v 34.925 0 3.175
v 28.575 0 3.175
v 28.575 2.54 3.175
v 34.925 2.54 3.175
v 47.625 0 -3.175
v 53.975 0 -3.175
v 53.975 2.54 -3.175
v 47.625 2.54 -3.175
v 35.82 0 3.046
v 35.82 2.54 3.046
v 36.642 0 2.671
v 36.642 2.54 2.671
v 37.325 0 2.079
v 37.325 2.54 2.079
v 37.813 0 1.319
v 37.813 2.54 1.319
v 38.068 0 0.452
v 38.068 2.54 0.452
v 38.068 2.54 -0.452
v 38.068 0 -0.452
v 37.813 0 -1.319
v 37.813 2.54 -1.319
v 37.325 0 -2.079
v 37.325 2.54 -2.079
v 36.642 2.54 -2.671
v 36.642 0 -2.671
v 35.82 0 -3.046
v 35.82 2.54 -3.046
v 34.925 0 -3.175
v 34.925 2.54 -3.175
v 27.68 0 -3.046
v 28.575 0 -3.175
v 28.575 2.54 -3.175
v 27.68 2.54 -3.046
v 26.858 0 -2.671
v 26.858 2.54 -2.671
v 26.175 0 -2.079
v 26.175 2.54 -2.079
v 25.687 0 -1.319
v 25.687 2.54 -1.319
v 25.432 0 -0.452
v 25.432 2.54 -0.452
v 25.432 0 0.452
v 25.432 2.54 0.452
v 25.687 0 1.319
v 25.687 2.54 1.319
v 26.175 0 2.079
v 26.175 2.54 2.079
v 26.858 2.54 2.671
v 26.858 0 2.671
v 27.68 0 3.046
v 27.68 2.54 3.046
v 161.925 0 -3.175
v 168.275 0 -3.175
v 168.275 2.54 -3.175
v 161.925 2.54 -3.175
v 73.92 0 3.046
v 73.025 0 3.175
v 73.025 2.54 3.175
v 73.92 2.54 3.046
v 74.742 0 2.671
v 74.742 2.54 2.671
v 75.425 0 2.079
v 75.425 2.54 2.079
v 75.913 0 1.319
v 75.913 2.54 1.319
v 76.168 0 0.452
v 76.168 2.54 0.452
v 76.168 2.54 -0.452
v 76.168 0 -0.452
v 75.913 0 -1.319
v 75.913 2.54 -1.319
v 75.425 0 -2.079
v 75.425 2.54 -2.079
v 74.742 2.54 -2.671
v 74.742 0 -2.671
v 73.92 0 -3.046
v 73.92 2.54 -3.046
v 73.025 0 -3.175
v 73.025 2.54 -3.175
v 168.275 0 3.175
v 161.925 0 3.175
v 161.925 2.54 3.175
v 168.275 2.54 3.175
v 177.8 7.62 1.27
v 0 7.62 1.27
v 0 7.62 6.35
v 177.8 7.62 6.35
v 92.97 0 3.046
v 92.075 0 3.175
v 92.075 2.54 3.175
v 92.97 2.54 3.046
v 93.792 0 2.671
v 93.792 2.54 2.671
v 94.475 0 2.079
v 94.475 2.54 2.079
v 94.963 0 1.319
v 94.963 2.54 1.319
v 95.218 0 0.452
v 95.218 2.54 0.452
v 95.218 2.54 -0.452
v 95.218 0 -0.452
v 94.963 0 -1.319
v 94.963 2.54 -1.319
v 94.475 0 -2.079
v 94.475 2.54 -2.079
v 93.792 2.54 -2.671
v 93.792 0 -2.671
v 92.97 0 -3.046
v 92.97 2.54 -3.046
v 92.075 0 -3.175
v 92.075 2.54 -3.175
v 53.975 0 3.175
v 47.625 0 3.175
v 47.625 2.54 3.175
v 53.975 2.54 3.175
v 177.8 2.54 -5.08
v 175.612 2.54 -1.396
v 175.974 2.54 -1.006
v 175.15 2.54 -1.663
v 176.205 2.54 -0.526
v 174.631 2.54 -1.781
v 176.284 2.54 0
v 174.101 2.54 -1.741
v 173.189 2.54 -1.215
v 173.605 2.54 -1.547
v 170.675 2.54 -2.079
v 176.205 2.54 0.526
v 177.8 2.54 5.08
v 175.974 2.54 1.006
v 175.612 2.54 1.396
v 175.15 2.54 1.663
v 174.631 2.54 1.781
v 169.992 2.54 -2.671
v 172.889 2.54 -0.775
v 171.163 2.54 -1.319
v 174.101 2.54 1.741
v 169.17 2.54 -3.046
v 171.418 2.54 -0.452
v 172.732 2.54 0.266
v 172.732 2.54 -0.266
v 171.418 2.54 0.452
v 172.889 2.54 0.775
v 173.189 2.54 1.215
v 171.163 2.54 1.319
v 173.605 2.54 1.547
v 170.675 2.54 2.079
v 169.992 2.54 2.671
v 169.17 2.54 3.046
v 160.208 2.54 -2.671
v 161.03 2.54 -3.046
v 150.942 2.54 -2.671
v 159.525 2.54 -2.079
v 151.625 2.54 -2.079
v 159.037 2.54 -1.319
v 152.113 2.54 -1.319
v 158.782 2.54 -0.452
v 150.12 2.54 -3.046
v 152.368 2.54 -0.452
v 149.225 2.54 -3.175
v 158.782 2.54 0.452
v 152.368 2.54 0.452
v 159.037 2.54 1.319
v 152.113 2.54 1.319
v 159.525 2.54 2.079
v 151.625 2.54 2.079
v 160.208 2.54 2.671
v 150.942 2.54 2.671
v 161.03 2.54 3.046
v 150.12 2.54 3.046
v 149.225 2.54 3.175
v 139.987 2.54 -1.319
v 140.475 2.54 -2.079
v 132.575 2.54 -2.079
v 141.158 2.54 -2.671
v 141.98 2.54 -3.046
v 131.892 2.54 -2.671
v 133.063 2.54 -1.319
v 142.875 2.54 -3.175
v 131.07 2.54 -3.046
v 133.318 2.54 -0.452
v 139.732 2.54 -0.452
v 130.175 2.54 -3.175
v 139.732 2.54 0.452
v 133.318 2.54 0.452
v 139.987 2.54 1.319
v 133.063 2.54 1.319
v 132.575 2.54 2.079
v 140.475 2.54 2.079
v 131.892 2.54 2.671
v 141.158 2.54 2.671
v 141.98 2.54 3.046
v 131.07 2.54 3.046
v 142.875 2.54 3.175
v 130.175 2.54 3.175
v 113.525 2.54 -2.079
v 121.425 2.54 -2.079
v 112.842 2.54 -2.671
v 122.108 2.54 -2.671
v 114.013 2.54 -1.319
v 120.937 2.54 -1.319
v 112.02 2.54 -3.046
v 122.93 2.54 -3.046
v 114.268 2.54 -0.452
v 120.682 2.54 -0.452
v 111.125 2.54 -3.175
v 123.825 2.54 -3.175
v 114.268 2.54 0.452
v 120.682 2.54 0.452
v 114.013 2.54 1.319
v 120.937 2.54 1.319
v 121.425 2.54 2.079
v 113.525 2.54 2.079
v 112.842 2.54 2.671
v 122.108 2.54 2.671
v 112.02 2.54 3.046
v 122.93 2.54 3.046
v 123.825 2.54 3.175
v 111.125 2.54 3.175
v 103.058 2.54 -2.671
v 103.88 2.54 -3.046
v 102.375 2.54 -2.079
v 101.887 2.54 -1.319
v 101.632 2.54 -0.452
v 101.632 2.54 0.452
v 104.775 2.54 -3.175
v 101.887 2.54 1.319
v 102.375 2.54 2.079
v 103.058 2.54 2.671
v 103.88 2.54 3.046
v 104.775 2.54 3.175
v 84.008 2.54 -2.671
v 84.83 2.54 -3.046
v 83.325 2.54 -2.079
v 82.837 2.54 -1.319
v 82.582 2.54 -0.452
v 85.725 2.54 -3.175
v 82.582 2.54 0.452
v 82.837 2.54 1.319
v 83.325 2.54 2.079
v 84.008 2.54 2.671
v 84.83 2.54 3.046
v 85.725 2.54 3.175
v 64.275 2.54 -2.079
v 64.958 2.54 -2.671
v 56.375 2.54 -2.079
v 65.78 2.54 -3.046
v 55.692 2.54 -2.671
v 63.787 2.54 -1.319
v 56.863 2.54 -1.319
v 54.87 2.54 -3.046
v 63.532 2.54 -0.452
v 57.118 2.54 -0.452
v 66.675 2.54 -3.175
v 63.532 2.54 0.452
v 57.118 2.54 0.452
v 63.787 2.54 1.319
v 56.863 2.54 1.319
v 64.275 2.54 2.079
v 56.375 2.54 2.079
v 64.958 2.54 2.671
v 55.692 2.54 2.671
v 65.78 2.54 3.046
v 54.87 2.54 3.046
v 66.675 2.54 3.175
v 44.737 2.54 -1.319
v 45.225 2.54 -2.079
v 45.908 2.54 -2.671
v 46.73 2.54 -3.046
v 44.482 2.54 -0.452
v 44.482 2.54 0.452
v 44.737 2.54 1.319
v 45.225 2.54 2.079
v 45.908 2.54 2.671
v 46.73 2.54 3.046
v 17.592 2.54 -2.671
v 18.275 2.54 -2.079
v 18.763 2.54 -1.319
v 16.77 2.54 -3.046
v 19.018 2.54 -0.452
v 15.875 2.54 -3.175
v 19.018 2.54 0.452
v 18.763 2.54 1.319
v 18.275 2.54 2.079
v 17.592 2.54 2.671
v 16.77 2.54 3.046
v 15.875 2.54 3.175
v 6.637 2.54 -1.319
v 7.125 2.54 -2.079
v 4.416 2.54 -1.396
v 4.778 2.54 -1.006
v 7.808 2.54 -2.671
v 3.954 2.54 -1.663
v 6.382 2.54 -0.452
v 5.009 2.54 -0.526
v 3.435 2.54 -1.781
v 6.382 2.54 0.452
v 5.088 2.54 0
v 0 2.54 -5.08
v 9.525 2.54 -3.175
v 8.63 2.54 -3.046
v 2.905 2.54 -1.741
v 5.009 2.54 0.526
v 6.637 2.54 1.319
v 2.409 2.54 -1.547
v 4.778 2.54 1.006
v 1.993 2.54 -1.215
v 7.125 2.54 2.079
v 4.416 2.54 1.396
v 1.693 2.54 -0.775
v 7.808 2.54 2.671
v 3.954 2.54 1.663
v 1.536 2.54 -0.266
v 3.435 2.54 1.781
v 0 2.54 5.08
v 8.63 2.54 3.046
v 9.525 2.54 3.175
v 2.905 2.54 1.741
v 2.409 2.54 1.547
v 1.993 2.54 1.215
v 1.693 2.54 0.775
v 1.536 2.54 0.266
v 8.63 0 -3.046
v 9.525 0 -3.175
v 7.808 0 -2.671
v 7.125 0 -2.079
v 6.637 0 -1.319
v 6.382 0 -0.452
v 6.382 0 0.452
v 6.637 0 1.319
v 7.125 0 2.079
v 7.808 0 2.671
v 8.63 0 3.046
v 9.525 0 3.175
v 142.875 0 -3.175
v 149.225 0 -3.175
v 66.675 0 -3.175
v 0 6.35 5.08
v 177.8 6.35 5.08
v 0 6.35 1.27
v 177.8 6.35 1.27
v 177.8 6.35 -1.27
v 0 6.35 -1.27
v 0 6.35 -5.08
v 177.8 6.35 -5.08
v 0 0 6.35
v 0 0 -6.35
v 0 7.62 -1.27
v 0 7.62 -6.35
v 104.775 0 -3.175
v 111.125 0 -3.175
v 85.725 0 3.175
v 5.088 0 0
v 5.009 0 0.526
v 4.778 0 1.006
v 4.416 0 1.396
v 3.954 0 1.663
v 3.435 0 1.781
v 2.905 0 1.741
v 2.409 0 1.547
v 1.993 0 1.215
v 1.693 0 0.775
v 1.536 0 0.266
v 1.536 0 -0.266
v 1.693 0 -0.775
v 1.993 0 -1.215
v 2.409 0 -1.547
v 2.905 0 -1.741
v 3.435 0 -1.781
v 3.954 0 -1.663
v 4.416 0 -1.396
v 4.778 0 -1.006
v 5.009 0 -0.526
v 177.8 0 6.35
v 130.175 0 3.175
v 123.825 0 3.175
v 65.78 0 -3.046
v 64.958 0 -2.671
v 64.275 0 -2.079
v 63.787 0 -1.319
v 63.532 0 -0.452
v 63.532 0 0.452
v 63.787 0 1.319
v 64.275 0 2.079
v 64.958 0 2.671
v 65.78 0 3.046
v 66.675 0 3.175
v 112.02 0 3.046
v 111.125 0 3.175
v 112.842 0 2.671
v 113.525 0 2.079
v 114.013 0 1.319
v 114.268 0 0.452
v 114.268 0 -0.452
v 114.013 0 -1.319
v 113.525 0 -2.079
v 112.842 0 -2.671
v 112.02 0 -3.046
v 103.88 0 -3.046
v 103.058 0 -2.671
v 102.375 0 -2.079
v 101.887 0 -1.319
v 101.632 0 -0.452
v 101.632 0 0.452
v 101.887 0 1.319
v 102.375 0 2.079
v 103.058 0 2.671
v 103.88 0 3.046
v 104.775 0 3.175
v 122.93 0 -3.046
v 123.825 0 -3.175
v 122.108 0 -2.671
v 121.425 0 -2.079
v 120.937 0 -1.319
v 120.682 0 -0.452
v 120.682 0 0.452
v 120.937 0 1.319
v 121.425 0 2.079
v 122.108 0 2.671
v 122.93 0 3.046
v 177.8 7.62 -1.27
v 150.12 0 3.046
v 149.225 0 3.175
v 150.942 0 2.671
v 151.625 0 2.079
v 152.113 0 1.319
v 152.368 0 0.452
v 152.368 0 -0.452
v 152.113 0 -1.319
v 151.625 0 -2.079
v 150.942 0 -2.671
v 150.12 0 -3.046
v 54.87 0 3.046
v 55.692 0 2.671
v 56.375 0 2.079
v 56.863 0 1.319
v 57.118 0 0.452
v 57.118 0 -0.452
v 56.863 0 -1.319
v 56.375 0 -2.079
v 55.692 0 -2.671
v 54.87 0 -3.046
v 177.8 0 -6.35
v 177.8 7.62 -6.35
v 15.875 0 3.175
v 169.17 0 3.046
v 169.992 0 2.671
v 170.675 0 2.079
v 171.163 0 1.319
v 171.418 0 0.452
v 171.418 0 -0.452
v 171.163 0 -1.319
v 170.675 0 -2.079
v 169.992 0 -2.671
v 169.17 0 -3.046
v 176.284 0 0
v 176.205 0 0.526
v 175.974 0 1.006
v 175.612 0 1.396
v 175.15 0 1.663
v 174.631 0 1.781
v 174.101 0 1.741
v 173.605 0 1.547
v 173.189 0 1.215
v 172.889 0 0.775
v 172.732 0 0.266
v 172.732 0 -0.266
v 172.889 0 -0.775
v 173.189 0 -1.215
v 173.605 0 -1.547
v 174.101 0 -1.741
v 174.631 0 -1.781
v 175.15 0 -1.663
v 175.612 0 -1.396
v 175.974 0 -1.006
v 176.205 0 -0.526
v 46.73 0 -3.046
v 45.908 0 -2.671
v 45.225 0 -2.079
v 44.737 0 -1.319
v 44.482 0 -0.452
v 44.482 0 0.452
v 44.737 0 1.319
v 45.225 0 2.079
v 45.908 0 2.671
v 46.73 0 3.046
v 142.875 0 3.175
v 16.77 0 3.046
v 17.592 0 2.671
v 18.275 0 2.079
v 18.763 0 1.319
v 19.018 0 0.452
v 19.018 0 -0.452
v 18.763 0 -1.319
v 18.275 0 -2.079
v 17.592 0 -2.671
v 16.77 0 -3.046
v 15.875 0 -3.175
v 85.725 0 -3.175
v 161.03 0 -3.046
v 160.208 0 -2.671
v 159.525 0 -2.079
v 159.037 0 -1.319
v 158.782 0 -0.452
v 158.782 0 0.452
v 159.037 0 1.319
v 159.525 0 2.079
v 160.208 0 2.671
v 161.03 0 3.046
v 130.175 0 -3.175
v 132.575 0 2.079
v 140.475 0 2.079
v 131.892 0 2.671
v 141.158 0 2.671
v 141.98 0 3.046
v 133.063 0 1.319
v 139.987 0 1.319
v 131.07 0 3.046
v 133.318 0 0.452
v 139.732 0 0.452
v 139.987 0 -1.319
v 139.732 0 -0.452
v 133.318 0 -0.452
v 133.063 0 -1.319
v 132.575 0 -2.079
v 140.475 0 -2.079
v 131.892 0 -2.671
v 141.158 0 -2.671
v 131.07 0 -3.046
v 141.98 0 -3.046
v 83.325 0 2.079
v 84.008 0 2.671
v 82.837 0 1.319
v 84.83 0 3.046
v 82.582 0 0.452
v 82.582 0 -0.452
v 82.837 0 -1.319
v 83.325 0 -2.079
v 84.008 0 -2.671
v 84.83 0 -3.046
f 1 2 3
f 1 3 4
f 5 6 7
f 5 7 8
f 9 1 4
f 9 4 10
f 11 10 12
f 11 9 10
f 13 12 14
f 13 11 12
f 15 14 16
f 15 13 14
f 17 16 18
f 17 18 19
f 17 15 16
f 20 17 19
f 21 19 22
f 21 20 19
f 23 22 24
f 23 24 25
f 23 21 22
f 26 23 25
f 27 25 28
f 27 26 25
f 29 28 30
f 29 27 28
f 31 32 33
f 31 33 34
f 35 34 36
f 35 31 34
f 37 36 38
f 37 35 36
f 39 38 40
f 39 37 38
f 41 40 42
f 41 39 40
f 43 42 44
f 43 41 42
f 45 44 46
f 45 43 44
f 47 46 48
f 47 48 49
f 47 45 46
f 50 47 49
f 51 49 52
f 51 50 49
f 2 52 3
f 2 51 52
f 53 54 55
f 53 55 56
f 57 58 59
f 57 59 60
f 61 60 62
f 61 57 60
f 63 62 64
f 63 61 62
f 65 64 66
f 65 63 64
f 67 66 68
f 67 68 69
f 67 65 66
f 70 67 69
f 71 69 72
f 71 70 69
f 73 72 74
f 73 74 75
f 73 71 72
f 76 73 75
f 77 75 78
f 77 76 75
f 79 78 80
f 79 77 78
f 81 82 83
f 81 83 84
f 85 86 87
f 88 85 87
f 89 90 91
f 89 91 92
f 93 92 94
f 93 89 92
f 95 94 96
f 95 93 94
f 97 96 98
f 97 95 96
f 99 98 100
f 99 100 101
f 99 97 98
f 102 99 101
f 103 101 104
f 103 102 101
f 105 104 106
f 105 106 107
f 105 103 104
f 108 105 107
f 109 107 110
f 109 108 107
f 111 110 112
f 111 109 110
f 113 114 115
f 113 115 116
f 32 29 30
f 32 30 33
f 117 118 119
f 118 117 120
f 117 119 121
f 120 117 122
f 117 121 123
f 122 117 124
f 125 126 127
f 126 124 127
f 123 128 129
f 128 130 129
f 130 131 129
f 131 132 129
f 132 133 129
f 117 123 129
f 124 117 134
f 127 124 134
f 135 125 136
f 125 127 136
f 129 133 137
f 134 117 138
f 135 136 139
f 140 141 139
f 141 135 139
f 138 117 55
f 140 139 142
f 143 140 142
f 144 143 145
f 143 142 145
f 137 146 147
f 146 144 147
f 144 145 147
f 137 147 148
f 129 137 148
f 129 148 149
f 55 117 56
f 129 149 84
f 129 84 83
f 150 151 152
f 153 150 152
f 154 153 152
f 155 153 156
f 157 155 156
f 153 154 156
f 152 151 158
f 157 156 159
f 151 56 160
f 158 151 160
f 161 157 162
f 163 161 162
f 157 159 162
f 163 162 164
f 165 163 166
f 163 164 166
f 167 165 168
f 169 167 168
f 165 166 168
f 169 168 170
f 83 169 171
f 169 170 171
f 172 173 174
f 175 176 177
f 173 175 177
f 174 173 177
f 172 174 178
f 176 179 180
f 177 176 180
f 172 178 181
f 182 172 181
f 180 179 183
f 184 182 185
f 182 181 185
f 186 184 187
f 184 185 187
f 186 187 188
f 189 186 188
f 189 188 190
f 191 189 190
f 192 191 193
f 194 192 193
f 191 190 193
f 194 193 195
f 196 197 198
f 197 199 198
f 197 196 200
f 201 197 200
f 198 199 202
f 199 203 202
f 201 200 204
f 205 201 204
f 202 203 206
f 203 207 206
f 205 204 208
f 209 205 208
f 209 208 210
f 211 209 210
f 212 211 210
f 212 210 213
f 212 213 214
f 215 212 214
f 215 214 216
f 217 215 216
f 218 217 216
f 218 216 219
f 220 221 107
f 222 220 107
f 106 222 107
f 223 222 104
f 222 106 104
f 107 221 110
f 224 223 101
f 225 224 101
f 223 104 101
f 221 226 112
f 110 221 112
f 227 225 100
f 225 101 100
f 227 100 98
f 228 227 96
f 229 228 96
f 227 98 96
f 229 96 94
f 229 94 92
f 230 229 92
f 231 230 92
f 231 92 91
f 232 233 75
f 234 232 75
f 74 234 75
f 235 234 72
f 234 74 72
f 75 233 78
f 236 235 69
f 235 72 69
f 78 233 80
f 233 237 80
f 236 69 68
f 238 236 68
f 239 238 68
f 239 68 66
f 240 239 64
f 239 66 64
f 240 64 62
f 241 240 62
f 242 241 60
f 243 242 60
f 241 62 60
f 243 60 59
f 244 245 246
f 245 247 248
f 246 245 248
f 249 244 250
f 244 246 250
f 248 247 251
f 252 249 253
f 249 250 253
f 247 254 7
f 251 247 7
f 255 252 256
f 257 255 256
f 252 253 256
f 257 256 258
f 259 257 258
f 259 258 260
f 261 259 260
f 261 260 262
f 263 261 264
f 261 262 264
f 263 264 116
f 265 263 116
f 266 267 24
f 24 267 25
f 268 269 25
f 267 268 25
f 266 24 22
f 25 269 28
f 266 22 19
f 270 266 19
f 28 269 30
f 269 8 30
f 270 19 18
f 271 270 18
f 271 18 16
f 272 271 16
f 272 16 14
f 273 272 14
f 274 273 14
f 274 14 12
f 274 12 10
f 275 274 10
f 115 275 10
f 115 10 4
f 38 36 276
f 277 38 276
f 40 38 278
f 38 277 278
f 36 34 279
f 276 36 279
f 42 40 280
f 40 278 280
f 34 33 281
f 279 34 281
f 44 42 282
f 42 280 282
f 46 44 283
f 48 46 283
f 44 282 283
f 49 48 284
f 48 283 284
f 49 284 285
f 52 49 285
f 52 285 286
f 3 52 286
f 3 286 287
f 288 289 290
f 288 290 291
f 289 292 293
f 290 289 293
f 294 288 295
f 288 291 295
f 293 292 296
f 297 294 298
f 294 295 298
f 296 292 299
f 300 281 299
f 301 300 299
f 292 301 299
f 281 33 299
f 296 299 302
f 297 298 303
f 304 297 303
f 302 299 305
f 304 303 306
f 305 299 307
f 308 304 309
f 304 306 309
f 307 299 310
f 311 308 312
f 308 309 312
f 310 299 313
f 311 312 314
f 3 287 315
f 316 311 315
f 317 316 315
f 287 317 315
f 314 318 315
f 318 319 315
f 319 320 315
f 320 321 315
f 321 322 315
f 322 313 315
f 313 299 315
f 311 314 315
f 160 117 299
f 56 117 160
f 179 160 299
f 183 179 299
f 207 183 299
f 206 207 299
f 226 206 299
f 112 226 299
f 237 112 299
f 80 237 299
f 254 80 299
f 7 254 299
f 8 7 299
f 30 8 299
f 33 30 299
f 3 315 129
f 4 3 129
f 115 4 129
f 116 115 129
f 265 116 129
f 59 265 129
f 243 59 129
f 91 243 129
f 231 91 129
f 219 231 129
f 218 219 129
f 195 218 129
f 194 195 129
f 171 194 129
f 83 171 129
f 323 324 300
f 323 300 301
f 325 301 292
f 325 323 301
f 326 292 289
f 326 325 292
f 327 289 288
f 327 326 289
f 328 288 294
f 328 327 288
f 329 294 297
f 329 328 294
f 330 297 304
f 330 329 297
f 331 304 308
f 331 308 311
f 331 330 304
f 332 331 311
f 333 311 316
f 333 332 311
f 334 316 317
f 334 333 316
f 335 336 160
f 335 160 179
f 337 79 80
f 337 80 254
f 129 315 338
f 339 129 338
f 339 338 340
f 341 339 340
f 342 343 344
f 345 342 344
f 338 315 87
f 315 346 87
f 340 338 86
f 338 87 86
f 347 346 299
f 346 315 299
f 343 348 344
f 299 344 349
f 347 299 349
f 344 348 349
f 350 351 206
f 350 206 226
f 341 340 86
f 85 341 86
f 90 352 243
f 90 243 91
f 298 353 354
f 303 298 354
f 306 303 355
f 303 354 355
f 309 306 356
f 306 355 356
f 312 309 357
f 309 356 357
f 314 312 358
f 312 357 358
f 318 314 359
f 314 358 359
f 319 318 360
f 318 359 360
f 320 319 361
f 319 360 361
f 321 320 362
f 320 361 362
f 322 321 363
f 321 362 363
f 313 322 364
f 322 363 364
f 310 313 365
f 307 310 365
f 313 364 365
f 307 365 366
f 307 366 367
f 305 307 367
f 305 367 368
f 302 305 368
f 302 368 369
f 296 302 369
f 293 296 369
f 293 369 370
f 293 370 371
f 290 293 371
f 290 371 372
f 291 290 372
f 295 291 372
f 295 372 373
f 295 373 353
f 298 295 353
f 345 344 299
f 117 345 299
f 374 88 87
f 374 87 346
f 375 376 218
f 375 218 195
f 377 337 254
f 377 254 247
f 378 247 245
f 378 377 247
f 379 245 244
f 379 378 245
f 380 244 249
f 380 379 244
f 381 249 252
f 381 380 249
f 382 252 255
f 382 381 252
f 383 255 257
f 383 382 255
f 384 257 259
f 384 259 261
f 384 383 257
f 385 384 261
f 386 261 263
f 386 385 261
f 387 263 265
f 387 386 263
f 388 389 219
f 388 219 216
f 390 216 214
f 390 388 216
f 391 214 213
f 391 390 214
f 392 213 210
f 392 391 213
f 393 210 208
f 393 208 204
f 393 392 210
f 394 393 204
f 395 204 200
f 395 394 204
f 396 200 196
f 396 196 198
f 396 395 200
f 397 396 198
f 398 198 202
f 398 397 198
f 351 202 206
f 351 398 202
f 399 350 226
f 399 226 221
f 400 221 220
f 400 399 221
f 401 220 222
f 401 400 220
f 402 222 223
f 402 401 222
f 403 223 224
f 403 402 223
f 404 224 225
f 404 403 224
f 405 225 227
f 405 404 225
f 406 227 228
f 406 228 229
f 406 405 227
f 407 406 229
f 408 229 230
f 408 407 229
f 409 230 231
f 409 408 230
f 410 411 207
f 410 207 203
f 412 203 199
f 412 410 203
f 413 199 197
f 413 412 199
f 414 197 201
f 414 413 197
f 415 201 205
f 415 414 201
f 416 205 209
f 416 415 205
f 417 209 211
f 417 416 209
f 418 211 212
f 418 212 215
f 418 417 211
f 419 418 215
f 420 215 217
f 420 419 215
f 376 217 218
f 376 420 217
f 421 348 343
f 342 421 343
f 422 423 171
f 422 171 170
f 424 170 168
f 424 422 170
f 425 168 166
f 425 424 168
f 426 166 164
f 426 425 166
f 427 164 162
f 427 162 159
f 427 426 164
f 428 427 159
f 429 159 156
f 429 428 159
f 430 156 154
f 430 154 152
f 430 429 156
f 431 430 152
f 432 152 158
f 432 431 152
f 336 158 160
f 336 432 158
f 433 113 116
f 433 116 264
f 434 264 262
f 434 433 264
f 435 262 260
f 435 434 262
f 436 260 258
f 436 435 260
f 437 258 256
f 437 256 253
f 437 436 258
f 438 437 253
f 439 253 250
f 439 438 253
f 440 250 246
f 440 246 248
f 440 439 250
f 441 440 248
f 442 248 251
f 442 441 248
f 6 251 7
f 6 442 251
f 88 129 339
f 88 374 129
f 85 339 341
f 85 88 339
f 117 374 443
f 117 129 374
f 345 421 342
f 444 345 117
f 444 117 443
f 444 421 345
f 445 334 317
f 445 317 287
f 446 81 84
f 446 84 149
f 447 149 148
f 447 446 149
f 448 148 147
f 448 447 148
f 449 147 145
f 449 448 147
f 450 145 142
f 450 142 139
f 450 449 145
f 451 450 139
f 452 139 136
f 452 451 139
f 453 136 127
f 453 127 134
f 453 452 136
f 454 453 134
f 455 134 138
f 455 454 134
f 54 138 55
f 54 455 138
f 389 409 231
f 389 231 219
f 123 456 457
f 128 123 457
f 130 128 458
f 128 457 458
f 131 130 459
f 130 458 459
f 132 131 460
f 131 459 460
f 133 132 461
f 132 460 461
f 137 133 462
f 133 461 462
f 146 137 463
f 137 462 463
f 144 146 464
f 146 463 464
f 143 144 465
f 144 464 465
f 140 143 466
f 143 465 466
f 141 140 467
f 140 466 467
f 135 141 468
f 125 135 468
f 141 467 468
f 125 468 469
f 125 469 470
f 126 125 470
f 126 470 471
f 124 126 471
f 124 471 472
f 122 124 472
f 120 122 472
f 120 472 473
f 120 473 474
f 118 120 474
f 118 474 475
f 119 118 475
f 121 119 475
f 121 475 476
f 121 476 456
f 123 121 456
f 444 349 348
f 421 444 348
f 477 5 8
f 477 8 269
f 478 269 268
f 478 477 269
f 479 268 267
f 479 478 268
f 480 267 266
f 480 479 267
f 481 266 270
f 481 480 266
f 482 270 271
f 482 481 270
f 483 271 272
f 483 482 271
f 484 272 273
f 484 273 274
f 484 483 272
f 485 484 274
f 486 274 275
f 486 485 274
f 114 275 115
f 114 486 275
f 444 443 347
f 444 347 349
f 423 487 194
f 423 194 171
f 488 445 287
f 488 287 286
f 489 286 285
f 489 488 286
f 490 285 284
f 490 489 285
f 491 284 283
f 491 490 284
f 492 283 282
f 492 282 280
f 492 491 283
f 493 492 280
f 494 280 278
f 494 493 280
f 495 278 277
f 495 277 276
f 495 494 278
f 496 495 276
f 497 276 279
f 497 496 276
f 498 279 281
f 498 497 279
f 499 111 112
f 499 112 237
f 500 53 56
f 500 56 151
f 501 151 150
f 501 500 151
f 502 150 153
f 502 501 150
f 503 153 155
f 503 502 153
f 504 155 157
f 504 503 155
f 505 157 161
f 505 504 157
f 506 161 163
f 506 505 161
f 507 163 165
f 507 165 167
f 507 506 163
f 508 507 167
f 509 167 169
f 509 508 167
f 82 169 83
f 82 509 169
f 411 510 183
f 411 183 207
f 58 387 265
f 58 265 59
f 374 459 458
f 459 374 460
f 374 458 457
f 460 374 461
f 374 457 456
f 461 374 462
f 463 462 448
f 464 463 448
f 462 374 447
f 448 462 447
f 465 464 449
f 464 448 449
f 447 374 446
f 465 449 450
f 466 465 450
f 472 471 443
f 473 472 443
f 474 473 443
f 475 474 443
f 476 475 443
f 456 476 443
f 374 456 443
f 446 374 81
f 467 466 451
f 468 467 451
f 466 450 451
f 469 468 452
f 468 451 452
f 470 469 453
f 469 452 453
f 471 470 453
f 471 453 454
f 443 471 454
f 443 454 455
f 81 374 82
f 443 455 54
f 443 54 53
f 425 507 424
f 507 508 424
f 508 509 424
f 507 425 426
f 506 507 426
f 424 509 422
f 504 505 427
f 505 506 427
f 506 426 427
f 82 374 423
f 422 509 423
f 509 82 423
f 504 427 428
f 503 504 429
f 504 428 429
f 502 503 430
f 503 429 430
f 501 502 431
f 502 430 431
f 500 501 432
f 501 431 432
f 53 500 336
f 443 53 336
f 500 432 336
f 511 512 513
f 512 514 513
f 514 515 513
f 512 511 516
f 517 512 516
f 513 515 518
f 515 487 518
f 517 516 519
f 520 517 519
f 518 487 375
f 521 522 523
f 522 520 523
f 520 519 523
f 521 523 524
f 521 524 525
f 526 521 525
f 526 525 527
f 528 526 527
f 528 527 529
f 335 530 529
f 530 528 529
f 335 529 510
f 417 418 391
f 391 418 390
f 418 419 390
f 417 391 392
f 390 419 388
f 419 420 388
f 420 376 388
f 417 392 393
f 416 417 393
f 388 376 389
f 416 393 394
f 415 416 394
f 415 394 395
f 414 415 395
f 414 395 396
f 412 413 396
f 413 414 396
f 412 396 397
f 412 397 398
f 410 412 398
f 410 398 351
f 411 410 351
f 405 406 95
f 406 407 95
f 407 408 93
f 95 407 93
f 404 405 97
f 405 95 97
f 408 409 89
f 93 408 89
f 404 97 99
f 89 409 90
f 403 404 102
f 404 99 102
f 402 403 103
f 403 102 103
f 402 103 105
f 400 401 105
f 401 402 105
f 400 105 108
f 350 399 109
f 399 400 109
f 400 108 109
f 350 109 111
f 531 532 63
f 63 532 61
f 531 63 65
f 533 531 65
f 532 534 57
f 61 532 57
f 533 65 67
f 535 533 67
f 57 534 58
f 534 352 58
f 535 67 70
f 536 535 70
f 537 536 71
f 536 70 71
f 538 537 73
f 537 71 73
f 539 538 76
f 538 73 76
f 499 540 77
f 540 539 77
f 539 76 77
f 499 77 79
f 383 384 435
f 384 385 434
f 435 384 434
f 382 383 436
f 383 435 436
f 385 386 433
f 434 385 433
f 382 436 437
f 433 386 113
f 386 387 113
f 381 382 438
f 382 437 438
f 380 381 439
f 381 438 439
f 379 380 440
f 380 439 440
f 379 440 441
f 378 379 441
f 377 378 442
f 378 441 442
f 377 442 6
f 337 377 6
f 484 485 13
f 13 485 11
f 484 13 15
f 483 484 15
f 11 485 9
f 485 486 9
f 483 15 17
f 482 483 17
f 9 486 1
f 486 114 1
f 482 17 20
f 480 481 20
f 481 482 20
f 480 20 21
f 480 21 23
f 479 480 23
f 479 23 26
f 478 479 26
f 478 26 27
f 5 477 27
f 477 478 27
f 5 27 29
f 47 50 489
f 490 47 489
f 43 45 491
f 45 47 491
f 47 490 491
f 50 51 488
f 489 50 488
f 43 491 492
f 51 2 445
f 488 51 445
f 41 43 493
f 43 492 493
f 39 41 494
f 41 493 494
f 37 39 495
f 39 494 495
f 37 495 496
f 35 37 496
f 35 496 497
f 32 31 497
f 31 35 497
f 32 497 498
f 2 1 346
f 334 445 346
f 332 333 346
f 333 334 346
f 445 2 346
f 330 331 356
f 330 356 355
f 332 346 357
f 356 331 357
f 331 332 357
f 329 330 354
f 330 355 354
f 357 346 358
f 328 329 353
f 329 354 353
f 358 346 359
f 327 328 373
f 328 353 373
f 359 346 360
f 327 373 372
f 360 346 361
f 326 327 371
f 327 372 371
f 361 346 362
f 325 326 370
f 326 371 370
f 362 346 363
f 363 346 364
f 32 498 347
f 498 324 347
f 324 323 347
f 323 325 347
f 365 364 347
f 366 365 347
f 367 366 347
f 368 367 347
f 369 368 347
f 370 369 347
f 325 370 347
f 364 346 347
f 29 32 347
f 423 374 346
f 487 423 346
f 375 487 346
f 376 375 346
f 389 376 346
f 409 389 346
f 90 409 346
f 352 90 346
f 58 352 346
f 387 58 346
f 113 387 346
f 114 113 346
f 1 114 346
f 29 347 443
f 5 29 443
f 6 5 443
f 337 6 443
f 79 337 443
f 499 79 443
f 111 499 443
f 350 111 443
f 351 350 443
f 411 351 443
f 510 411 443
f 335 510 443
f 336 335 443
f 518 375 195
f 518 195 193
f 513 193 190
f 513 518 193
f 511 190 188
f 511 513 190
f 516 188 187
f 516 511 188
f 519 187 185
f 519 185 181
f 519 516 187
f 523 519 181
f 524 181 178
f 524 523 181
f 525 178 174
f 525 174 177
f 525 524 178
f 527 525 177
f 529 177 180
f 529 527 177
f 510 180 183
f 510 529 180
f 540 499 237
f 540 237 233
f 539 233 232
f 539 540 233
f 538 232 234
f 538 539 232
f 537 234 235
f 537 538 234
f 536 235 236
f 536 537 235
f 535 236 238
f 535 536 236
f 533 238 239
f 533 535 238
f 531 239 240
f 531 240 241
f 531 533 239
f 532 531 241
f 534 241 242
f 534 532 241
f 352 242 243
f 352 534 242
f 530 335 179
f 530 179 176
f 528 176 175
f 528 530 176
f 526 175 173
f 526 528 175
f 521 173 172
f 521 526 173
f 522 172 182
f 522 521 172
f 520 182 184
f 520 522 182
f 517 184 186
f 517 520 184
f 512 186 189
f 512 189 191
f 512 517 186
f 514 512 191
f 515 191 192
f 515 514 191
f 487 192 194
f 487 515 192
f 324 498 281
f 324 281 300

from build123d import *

# Parameters (mm, degrees)
BOSS_EXTRUDE1_DEPTH                 = 177.8
F_9_64_0_14063_DIAMETER_HOLE1_D     = 3.572002
F_9_64_0_14063_DIAMETER_HOLE1_DEPTH = 2.54
CUT_EXTRUDE1_START                  = -2.54
CUT_EXTRUDE1_DEPTH                  = 2.54
LPATTERN1_COUNT                     = 9
LPATTERN1_PITCH                     = 19.05


# Read off the part's stored shape, not the designer's step: Cut-Extrude1
with BuildPart() as part:
    # Sketch2 → Boss-Extrude1 (new body)
    with BuildSketch(Plane(origin=(0, 0, 0), x_dir=(0, 0, -1), z_dir=(1, 0, 0))):
        Polygon((-6.35, 0), (6.35, 0), (6.35, 7.62), (1.27, 7.62), (1.27, 6.35), (5.08, 6.35), (5.08, 2.54), (-5.08, 2.54), (-5.08, 6.35), (-1.27, 6.35), (-1.27, 7.62), (-6.35, 7.62), align=None)
    extrude(amount=BOSS_EXTRUDE1_DEPTH)

    # 9/64 (0.14063) Diameter Hole1
    with Locations(Plane(origin=(0, 2.54, 0), x_dir=(-1, 0, 0), z_dir=(0, 1, 0))):
        with Locations((-3.302, 0), (-174.498, 0)):
            Hole(F_9_64_0_14063_DIAMETER_HOLE1_D / 2, depth=F_9_64_0_14063_DIAMETER_HOLE1_DEPTH)

    # Cut-Extrude1 outline → Cut-Extrude1 (cut)
    with BuildSketch(Plane(origin=(0, 2.54, 0), x_dir=(1, 0, 0), z_dir=(0, 1, 0)).offset(CUT_EXTRUDE1_START)):
        with BuildLine():
            Line((15.875, 3.175), (9.525, 3.175))
            ThreePointArc((9.525, 3.175), (6.35, 0), (9.525, -3.175))
            Line((9.525, -3.175), (15.875, -3.175))
            ThreePointArc((15.875, -3.175), (19.05, 0), (15.875, 3.175))
        make_face()
    cut_extrude1 = extrude(amount=CUT_EXTRUDE1_DEPTH, mode=Mode.SUBTRACT)

    # LPattern1: Cut-Extrude1 ×9
    with Locations(*[(i * LPATTERN1_PITCH, 0, 0) for i in range(1, LPATTERN1_COUNT)]):
        add(cut_extrude1, mode=Mode.SUBTRACT)


solid = part.part
